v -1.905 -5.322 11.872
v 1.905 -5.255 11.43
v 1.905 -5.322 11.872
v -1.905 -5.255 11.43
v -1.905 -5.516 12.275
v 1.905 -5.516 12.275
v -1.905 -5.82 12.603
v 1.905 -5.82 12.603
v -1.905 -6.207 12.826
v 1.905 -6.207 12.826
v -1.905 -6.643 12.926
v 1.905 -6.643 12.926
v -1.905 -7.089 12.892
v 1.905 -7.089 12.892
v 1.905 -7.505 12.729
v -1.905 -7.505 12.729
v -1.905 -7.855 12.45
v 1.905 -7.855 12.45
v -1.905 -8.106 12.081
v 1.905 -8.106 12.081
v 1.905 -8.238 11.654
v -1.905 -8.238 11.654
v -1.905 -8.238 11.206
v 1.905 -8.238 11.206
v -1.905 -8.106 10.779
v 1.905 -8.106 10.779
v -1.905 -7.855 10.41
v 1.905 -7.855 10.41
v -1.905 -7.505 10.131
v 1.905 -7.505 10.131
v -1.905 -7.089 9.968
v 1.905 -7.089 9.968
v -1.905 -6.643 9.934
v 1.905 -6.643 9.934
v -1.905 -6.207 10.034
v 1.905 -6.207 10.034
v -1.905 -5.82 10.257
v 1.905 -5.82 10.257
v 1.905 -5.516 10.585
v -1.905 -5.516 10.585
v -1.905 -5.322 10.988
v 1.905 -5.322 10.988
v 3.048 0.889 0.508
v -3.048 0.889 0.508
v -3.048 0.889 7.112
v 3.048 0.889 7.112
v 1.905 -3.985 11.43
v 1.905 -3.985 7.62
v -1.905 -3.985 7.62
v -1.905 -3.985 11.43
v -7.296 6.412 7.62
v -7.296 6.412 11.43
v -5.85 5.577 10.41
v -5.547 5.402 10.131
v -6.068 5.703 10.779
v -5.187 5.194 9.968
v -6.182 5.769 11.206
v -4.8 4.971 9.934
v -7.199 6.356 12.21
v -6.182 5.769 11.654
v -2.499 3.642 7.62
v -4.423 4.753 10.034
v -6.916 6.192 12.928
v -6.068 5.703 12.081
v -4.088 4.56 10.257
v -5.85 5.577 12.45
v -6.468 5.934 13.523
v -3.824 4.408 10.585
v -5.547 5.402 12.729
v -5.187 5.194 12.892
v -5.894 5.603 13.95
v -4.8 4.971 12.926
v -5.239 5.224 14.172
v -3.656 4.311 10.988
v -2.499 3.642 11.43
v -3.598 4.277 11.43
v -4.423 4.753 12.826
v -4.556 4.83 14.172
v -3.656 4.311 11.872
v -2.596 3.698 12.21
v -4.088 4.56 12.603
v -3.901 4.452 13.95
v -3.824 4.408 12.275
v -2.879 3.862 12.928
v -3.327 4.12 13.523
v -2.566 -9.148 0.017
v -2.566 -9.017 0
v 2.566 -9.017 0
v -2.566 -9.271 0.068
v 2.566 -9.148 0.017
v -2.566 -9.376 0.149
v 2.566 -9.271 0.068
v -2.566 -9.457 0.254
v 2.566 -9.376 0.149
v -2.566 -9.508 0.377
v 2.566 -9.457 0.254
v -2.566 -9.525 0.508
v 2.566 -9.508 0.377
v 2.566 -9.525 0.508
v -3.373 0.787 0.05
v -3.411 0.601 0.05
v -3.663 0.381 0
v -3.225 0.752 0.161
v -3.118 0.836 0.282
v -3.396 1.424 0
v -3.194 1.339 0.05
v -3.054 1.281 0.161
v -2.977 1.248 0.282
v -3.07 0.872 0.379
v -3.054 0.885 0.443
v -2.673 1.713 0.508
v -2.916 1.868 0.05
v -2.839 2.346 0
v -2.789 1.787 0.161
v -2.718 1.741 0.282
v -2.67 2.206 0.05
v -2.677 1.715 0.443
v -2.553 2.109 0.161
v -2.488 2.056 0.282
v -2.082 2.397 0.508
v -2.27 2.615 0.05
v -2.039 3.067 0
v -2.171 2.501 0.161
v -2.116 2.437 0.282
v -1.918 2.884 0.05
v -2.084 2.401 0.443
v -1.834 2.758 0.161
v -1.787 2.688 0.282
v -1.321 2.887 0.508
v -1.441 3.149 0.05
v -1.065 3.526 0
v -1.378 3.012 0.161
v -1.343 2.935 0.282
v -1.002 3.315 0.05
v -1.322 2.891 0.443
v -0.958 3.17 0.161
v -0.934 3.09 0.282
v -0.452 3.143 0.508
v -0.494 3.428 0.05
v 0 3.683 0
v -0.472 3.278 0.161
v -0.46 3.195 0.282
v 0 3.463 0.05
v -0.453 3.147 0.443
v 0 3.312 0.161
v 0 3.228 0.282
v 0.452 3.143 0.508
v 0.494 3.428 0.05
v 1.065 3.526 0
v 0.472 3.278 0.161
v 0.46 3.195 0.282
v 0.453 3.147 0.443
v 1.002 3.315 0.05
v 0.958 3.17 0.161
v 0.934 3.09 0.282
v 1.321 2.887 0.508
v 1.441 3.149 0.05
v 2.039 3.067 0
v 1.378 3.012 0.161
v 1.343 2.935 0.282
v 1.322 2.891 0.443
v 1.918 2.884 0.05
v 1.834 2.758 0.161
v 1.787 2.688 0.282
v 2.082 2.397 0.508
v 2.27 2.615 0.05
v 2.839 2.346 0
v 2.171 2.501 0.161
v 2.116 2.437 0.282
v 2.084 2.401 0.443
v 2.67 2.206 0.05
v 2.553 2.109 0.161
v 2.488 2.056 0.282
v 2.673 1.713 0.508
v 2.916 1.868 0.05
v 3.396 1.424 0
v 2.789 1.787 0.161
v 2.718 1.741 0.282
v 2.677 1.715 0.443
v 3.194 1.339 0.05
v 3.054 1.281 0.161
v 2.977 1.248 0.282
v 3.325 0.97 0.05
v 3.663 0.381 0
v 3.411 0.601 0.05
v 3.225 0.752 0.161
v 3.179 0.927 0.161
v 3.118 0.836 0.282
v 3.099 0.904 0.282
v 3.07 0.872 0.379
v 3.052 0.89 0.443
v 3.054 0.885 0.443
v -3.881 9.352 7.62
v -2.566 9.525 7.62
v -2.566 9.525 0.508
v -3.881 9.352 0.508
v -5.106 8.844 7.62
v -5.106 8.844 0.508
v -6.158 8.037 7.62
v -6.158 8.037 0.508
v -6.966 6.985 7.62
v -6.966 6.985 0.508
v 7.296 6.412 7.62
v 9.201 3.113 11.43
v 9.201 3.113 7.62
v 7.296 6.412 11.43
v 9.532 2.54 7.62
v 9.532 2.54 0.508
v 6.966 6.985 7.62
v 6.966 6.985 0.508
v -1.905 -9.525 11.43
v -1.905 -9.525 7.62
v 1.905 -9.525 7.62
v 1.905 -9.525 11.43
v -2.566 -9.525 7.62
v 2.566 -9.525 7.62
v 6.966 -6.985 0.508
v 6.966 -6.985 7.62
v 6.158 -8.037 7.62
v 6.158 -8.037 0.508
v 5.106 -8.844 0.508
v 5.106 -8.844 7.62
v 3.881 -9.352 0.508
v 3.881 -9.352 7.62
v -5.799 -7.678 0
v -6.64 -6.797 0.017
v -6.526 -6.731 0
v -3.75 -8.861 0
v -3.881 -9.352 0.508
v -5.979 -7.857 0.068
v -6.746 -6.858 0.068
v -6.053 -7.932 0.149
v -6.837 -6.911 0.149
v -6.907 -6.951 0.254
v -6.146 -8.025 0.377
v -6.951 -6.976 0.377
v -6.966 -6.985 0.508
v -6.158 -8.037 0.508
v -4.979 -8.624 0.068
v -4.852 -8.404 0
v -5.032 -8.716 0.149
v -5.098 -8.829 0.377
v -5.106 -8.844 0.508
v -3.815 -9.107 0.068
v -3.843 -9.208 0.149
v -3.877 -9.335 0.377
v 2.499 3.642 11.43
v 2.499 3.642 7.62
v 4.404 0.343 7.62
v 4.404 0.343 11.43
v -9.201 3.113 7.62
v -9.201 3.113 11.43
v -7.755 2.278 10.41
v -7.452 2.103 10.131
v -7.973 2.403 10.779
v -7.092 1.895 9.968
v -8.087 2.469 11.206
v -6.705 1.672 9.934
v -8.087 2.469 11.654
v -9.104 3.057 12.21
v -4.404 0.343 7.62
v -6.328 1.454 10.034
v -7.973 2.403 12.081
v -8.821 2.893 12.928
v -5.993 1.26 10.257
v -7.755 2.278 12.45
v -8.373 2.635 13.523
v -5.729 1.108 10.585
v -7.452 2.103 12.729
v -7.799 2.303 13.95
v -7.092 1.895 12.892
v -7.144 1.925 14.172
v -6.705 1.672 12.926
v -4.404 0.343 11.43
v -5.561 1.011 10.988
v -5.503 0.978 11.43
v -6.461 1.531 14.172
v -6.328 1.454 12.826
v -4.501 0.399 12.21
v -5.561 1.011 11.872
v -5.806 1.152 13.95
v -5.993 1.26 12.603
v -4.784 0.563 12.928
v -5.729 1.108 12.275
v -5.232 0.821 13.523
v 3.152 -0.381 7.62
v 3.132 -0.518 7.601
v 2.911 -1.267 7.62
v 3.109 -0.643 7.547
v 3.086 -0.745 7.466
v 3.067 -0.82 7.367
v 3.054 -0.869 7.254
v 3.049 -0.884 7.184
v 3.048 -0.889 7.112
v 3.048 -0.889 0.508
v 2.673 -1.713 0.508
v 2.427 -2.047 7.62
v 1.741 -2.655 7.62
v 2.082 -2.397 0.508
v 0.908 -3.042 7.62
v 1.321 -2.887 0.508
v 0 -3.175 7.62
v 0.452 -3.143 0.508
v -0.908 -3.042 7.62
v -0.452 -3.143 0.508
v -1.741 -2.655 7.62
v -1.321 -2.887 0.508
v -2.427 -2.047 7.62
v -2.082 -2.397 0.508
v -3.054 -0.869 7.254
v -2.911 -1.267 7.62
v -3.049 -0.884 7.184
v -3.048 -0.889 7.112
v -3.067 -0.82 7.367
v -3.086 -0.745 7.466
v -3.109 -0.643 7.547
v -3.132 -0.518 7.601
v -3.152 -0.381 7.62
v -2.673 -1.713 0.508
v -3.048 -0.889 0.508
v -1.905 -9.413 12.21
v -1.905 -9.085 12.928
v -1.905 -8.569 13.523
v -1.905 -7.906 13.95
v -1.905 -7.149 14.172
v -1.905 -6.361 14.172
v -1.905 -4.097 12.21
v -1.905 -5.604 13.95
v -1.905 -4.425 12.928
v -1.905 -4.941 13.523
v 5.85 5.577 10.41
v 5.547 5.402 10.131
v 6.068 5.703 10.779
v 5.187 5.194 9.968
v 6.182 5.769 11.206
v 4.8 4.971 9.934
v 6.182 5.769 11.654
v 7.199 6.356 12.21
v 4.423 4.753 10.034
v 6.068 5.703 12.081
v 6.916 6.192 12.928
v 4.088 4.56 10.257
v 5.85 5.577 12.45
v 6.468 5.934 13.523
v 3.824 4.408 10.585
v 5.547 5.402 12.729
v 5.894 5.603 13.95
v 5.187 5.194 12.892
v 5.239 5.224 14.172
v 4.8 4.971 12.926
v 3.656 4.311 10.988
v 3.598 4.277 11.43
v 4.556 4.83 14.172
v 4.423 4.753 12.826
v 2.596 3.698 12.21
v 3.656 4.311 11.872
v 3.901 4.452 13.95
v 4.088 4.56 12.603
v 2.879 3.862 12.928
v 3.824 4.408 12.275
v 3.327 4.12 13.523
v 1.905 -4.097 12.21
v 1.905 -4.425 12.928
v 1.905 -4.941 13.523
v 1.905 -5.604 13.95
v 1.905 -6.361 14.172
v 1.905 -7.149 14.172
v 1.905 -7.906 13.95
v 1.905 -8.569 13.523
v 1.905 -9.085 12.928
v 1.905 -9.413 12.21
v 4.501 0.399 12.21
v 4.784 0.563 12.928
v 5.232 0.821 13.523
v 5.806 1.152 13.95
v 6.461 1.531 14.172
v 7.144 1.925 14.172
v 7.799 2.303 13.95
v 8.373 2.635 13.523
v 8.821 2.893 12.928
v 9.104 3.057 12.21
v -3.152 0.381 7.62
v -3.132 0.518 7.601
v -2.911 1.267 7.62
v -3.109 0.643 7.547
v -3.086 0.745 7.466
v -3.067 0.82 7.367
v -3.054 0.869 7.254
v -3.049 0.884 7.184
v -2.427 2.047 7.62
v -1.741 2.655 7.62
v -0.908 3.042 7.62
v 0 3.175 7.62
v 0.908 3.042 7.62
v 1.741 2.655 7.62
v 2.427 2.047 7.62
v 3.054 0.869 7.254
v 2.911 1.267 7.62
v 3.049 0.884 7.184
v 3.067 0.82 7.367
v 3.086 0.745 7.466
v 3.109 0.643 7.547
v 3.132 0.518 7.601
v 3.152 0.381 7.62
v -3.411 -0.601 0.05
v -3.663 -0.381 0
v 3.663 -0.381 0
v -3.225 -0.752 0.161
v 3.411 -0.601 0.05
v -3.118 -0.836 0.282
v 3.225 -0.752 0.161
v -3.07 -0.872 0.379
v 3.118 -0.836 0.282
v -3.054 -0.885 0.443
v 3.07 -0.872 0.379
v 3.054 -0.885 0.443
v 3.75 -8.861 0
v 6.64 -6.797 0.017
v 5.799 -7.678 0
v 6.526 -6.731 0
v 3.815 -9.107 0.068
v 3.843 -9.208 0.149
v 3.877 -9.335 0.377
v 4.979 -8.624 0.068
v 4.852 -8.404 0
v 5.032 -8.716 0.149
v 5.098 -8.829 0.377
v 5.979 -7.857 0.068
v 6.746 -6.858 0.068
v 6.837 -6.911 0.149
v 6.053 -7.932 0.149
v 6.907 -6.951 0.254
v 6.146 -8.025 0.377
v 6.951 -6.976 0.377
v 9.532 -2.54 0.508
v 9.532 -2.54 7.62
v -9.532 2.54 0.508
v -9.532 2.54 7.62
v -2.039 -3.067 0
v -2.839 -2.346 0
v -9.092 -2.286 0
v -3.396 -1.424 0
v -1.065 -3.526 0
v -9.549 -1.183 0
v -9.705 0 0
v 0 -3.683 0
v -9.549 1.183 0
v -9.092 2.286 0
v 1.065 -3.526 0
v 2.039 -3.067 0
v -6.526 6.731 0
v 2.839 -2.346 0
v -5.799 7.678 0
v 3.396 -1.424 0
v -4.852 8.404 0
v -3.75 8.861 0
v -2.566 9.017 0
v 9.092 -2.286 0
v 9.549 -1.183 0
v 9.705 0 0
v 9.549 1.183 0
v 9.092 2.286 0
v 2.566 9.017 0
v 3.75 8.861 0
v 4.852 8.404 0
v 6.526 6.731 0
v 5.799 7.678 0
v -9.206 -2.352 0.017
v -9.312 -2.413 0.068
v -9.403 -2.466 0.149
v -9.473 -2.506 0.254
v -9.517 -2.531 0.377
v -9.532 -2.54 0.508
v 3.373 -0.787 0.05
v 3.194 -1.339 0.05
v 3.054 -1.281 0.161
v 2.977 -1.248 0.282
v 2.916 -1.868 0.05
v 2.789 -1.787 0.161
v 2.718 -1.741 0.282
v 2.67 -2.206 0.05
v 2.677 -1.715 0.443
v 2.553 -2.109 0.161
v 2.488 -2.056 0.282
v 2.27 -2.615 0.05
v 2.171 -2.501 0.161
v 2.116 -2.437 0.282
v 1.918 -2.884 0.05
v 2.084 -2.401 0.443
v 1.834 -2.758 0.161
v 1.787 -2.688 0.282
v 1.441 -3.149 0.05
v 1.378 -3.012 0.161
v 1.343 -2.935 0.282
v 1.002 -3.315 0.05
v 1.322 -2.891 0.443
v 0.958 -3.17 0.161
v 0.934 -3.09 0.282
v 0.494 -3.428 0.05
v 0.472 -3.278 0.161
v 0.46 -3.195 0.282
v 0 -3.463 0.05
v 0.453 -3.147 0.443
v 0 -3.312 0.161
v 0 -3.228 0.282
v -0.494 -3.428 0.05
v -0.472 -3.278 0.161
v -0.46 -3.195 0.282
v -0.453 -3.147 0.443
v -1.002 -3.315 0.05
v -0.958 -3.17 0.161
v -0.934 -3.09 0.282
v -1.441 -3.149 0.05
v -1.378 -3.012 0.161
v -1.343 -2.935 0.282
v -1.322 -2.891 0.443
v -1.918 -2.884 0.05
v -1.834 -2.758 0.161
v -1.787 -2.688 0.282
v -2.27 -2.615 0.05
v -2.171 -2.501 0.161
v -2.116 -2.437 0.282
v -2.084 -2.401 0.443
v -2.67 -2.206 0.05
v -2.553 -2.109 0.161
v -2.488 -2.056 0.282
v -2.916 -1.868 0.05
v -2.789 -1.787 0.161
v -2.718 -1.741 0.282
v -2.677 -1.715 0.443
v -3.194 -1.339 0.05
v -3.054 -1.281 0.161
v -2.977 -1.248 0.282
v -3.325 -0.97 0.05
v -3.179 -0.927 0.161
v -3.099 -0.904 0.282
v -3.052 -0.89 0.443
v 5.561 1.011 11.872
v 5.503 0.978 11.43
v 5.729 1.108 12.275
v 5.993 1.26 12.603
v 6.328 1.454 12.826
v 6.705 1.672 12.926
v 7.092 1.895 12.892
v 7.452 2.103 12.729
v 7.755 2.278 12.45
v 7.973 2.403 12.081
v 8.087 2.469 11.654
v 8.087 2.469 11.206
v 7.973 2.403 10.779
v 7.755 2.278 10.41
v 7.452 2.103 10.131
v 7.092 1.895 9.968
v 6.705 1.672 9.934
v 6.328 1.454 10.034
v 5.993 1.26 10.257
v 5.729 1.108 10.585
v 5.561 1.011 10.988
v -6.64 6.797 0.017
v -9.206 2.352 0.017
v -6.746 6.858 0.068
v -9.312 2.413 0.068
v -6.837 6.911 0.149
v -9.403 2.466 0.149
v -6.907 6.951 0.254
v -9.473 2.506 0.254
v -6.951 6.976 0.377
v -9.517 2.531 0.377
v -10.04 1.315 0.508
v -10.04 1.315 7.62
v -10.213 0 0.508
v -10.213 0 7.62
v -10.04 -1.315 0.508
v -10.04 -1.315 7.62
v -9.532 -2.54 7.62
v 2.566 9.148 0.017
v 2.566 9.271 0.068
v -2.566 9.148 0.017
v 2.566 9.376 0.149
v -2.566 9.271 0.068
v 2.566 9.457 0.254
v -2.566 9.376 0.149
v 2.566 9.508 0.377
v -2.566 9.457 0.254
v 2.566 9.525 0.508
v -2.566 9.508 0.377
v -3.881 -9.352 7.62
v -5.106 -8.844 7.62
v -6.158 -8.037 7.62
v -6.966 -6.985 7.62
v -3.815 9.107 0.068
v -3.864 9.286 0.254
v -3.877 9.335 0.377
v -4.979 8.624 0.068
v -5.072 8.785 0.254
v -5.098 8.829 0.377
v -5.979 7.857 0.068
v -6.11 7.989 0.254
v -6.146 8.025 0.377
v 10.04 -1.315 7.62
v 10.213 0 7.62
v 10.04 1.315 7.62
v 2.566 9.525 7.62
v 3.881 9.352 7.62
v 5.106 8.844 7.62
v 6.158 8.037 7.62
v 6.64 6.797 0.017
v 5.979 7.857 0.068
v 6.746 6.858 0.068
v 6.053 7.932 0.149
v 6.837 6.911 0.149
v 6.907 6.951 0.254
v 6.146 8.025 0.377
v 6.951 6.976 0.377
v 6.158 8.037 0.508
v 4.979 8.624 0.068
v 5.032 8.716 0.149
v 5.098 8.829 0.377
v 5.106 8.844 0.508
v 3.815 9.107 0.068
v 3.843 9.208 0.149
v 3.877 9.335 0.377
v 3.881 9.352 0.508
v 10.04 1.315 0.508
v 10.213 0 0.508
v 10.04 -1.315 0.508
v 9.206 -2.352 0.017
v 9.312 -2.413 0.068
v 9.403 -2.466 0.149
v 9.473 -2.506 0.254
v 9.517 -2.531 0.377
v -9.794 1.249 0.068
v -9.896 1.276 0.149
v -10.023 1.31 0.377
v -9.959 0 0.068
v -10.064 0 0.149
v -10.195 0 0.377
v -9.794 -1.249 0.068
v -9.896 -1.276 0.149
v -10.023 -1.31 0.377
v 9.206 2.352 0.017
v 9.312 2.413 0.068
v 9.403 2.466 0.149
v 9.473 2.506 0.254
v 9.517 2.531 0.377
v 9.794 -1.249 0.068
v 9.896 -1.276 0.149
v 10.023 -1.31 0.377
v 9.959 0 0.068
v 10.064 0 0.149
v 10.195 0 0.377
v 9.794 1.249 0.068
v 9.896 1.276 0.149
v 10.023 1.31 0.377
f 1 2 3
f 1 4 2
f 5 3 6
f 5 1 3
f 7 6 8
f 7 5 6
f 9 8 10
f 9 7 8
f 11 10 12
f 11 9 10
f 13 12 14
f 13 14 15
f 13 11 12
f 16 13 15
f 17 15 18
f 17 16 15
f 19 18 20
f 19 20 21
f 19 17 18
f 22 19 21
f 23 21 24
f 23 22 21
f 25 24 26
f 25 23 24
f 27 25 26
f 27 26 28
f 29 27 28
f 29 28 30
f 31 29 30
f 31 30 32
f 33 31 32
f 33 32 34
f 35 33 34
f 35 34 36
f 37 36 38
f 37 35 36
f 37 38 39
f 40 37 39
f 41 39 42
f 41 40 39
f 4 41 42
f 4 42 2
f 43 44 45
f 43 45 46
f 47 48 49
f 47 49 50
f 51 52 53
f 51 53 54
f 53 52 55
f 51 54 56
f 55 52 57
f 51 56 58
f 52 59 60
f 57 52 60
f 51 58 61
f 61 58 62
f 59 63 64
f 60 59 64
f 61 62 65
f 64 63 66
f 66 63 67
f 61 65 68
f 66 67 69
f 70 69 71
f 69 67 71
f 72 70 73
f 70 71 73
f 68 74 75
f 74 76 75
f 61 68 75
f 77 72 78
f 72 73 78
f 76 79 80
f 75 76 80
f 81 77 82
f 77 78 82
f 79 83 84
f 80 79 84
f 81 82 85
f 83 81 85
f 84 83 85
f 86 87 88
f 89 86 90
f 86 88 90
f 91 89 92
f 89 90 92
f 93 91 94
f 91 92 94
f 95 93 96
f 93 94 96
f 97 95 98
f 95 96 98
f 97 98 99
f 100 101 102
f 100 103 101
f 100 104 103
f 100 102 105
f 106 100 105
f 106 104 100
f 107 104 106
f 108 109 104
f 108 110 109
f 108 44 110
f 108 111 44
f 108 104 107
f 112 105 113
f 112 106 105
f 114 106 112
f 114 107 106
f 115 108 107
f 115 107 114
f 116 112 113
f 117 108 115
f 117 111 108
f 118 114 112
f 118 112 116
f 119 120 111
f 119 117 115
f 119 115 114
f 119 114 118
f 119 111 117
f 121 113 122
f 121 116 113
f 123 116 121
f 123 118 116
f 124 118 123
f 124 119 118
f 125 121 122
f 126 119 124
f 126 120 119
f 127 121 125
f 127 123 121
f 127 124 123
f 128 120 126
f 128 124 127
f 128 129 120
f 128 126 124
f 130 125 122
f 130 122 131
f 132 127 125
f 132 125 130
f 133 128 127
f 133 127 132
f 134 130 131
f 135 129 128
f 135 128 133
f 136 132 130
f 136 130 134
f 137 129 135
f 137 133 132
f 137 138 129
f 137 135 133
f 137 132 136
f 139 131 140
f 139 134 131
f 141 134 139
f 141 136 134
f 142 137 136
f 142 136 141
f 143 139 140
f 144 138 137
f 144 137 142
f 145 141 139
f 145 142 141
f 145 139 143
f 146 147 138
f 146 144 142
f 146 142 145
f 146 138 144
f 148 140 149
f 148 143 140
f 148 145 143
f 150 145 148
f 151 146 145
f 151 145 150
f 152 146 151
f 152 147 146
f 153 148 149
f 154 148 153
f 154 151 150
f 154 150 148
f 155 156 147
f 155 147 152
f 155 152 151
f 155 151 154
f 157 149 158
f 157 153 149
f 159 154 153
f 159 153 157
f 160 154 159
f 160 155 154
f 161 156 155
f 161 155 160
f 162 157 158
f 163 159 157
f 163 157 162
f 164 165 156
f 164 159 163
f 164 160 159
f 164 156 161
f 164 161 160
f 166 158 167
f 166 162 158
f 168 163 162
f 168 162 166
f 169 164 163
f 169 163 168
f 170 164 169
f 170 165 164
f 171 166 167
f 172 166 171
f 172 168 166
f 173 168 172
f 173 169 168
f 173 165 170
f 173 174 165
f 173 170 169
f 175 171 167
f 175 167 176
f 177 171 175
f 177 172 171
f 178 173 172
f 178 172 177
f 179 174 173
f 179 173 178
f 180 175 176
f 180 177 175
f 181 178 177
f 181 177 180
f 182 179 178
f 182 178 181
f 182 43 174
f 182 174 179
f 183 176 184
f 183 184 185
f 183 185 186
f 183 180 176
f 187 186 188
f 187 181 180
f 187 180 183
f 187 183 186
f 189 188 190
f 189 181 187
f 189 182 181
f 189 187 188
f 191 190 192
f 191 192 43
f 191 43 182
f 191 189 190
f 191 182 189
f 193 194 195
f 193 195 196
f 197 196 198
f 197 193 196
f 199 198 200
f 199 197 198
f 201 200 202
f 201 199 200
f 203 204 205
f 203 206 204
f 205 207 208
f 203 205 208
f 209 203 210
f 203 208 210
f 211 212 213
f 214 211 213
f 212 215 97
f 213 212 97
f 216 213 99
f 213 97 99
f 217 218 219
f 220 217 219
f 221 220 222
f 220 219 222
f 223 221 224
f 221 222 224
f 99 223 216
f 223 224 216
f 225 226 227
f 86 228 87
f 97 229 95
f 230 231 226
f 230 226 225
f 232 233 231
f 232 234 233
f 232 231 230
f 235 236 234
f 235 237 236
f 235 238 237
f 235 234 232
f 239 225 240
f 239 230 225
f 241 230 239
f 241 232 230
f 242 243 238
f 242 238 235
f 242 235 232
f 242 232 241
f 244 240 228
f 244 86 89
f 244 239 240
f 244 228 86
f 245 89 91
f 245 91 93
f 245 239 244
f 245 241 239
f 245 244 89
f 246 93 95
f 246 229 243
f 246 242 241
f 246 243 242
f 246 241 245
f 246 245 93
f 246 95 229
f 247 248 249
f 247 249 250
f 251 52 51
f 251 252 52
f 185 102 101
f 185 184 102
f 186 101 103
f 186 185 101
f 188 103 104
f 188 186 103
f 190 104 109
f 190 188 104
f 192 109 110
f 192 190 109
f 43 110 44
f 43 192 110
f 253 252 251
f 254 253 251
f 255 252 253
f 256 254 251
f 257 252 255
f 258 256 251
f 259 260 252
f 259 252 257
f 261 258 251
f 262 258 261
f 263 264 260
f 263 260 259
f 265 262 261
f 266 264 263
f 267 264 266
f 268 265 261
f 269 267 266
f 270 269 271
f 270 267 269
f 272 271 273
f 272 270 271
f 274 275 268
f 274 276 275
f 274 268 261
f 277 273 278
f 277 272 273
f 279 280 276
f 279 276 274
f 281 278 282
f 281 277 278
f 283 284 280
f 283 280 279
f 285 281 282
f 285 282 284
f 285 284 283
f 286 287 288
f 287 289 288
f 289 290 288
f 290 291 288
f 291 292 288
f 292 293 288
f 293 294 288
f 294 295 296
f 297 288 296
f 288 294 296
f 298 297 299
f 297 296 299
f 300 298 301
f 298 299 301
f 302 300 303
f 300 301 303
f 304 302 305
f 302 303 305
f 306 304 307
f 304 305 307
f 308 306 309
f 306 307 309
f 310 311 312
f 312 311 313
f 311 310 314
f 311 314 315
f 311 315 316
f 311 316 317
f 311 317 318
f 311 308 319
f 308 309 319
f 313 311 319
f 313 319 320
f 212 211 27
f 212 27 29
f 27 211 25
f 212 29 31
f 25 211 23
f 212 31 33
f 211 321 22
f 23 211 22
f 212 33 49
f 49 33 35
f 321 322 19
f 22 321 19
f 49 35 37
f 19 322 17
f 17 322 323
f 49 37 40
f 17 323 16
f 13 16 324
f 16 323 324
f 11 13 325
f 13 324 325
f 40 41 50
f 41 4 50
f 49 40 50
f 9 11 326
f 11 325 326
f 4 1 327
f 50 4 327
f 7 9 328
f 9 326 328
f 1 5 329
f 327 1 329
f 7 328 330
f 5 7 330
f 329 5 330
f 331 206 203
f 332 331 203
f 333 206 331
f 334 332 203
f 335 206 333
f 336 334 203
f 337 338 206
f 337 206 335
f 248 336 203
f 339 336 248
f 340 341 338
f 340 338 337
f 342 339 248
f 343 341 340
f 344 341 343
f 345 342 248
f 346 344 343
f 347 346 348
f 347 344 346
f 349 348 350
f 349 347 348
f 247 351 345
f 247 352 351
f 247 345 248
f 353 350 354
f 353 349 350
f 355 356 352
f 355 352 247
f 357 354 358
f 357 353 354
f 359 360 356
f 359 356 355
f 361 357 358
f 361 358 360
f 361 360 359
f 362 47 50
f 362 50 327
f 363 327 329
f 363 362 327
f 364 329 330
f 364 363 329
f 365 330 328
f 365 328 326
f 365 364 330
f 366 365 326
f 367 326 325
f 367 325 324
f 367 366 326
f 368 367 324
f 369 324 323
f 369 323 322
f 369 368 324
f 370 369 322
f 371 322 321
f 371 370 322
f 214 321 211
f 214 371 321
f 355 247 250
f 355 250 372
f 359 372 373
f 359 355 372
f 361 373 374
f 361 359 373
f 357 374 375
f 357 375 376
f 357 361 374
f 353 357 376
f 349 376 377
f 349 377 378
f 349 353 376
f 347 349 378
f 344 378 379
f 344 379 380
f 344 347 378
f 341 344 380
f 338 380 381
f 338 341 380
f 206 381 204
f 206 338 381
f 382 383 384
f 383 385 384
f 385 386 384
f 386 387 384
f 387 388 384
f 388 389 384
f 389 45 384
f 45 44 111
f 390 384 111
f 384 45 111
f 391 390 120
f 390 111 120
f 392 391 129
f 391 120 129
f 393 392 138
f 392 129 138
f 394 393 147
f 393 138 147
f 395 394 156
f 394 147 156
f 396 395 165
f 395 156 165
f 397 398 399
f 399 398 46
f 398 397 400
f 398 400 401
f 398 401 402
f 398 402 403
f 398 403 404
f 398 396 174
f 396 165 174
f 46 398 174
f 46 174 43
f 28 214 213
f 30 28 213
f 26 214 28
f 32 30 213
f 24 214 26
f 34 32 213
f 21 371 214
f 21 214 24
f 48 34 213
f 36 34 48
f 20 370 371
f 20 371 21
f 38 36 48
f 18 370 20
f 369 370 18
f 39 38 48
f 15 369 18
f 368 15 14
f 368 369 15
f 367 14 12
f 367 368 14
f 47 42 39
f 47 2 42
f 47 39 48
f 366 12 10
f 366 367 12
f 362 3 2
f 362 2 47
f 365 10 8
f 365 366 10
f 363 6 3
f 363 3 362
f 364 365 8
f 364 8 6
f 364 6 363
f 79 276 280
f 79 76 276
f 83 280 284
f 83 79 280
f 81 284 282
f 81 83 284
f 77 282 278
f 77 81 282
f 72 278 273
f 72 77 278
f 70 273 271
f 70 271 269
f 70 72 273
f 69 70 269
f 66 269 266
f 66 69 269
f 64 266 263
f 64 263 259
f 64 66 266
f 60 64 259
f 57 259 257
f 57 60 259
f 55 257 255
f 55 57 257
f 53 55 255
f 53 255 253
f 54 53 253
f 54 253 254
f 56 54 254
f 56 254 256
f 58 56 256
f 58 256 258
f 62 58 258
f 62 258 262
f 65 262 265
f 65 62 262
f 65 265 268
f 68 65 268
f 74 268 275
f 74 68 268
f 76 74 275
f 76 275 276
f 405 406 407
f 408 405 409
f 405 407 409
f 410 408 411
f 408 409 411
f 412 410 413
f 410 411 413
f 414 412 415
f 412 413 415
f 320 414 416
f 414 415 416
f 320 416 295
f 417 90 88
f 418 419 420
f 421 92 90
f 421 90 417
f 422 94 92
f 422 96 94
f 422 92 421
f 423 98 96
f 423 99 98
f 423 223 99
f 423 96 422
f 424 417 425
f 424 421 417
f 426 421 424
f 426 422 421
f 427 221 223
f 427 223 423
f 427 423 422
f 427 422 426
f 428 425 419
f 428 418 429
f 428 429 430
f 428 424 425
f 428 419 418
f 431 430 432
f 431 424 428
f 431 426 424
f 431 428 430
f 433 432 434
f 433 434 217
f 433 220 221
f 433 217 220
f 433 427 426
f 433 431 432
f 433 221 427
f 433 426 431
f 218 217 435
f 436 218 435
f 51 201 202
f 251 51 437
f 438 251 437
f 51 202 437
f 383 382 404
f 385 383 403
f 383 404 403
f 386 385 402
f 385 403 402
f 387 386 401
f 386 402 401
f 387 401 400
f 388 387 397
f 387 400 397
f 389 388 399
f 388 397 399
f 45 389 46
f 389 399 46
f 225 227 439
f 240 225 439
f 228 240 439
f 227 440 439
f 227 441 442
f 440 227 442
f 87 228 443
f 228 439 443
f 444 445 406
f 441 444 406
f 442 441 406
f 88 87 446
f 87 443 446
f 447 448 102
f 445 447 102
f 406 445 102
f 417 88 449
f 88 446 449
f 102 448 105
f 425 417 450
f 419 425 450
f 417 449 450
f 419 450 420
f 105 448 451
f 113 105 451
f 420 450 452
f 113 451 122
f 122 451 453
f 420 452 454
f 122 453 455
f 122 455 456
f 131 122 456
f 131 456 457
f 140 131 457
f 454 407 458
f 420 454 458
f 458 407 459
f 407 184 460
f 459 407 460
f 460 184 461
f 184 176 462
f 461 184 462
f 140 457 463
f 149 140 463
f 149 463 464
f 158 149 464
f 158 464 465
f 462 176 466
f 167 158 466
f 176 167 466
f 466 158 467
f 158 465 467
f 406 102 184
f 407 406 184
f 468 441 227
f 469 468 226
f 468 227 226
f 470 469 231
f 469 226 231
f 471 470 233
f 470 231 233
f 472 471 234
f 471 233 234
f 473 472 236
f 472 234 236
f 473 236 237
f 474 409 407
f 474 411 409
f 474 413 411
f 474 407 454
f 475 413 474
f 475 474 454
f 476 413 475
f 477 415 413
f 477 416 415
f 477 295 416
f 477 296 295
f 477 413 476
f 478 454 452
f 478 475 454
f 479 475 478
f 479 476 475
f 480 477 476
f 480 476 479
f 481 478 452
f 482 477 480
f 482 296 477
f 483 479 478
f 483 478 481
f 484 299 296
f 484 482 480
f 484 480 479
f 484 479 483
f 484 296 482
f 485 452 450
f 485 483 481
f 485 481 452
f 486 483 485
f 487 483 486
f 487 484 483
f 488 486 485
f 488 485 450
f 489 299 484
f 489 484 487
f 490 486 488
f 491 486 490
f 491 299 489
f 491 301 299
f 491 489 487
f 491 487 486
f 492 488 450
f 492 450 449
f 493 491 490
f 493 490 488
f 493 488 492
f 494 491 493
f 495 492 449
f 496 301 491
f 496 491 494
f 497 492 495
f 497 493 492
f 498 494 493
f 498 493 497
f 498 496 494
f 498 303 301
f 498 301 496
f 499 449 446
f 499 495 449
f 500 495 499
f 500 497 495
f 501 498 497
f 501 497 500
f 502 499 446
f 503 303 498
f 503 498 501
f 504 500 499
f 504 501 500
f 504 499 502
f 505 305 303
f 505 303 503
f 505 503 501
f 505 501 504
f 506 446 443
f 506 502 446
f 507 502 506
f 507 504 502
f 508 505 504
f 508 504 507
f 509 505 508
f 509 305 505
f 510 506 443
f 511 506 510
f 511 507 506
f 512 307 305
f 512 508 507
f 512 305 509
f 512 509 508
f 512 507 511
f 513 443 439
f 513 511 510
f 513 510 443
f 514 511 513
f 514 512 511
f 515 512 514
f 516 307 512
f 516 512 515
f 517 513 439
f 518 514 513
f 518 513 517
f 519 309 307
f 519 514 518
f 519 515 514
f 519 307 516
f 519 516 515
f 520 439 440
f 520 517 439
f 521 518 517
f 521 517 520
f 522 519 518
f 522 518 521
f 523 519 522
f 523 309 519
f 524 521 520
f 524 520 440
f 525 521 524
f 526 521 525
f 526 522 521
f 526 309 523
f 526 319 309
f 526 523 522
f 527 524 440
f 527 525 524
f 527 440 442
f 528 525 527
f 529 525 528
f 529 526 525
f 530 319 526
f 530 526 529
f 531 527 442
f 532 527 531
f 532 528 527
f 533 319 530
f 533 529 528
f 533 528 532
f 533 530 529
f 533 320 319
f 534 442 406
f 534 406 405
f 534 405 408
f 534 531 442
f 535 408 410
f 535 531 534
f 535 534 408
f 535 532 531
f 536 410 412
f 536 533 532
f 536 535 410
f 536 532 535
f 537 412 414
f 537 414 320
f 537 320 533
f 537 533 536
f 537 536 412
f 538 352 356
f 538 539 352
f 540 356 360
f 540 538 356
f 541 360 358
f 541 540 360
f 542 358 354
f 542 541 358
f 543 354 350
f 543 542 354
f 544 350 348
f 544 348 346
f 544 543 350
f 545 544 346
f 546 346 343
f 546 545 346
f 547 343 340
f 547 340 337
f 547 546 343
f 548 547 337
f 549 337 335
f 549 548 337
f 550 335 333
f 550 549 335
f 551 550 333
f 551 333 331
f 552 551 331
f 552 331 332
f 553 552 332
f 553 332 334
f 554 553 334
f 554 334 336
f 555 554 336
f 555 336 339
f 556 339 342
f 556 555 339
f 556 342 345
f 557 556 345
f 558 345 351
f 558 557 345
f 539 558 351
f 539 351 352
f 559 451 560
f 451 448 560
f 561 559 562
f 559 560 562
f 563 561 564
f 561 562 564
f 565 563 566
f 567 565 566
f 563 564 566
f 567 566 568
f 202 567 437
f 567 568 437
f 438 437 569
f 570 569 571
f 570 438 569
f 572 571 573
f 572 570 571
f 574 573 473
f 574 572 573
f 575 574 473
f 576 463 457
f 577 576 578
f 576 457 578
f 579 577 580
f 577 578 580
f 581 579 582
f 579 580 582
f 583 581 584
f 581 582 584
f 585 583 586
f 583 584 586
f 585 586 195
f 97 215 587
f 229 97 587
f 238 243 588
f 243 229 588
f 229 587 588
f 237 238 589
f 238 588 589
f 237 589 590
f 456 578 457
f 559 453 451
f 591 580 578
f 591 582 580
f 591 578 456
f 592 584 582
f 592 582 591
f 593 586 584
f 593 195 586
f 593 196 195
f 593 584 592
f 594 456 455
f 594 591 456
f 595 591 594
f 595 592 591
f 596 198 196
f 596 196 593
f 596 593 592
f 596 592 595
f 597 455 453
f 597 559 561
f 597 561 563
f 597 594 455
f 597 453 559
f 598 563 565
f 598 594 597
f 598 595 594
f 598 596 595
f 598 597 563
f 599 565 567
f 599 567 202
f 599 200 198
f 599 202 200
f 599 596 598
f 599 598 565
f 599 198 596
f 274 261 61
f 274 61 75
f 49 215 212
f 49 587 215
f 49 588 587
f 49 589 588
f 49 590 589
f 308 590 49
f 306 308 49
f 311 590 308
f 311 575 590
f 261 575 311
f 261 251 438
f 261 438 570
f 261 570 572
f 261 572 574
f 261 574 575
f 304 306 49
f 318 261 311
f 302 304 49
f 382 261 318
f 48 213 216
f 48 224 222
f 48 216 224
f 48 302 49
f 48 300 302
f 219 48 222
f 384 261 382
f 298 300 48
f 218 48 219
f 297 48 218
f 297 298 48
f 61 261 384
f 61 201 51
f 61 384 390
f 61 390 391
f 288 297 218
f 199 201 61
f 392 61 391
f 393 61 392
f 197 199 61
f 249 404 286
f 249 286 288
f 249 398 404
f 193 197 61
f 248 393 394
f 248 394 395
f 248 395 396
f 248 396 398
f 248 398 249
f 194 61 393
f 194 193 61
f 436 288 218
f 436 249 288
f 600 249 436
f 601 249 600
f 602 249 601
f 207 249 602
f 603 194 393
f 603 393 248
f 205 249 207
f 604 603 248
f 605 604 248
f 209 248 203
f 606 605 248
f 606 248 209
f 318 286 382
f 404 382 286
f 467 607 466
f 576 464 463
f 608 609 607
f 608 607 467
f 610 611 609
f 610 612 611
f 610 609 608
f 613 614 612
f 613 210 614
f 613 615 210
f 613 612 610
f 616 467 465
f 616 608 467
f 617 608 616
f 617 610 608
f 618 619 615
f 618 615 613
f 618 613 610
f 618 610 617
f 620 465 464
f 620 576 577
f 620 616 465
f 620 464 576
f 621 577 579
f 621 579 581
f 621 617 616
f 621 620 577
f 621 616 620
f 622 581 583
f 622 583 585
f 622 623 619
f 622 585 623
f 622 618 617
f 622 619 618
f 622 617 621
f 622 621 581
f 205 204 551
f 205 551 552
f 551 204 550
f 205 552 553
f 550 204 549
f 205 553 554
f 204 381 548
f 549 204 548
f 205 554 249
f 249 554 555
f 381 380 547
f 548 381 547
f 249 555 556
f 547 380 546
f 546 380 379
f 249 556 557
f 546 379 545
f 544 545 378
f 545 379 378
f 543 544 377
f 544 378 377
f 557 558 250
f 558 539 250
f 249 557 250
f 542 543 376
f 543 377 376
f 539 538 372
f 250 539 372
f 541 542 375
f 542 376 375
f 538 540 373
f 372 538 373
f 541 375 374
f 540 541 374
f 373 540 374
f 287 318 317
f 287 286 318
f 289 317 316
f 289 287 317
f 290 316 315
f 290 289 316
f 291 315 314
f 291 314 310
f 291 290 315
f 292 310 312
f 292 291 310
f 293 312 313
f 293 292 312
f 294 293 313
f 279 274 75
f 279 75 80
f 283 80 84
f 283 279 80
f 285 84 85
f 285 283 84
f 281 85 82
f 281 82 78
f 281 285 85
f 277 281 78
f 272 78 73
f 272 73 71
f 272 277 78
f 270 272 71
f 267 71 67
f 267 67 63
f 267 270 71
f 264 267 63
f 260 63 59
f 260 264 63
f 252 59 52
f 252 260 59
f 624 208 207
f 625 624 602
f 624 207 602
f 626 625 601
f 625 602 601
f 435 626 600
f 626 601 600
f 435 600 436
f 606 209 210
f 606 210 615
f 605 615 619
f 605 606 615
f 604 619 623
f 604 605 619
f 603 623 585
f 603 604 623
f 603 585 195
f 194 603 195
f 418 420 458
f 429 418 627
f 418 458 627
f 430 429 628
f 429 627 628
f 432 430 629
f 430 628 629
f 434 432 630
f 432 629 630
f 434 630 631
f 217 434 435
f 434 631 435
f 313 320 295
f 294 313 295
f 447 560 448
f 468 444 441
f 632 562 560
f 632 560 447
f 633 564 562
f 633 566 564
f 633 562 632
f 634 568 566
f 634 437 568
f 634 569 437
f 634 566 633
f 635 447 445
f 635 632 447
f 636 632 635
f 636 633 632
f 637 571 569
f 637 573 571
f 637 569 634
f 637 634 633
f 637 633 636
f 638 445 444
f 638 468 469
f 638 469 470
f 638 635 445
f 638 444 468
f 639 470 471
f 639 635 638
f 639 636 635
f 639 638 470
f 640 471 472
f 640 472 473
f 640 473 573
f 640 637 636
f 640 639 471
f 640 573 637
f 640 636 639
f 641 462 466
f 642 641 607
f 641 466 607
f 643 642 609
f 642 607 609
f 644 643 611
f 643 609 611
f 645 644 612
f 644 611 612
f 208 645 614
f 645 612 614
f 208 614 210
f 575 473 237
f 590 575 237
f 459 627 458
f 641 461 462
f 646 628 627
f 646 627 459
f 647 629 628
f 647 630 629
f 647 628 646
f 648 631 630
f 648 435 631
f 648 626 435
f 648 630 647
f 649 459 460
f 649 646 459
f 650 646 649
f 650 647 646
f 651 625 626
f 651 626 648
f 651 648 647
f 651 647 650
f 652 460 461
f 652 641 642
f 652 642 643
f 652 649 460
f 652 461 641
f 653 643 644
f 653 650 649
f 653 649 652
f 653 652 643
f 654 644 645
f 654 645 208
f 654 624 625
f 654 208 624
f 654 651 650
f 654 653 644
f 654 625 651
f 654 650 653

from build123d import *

# Parameters (mm, degrees)
F0_W            = 6.096
F0_H            = 1.778
F1_DEPTH        = 7.62
F2_R            = 1.5
F3_DEPTH        = 1.905
F3_COPIES_COUNT = 3
F4_R            = 5.08
F5_R            = 0.508


# Not quite as in the source:
# - a pattern or mirror of a feature is missing from the dataset's text; its kind, count and spacing are read off the source's solid


with BuildPart() as f1:
    # F0 (on Top) → F1 (new body)
    with BuildSketch(Plane.XY):
        Polygon((10.9985226281, 0), (5.499261314, 9.525), (-5.499261314, 9.525), (-10.9985226281, 0), (-5.499261314, -9.525), (5.499261314, -9.525), align=None)
        with BuildLine():
            ThreePointArc((3.048, 0.889), (3.1430896424, 0.4490128061), (3.175, 0))
            ThreePointArc((3.175, 0), (3.1430896424, -0.4490128061), (3.048, -0.889))
            ThreePointArc((3.048, -0.889), (0, -3.175), (-3.048, -0.889))
            ThreePointArc((-3.048, -0.889), (-3.175, 0), (-3.048, 0.889))
            ThreePointArc((-3.048, 0.889), (0, 3.175), (3.048, 0.889))
        make_face(mode=Mode.SUBTRACT)
        Rectangle(F0_W, F0_H)
        with BuildLine():
            Line((-3.048, -0.889), (-3.048, 0.889))
            ThreePointArc((-3.048, 0.889), (-3.175, 0), (-3.048, -0.889))
        make_face()
        with BuildLine():
            ThreePointArc((3.048, -0.889), (3.1430896424, -0.4490128061), (3.175, 0))
            ThreePointArc((3.175, 0), (3.1430896424, 0.4490128061), (3.048, 0.889))
            Line((3.048, 0.889), (3.048, -0.889))
        make_face()
    extrude(amount=F1_DEPTH)

    # F2 (on Right) → F3 (join, symmetric)
    with BuildSketch(Plane.YZ):
        with BuildLine():
            Line((-9.525, 7.62), (-3.985, 7.62))
            Line((-3.985, 7.62), (-3.985, 11.43))
            ThreePointArc((-3.985, 11.43), (-6.755, 14.2), (-9.525, 11.43))
            Line((-9.525, 11.43), (-9.525, 7.62))
        make_face()
        with Locations((-6.755, 11.43)):
            Circle(F2_R, mode=Mode.SUBTRACT)
    f3 = extrude(amount=F3_DEPTH, both=True)

    # F3_copies: F3 ×3 about axis
    f3_copies_axis = Axis((0, 0, 0), (0, 0, 1))
    for i in range(1, F3_COPIES_COUNT):
        add(f3.rotate(f3_copies_axis, i * 360 / F3_COPIES_COUNT))

    # F4
    f4_edges = [f1.edges().sort_by_distance(p)[0] for p in [
        (-5.499261, -9.525, 3.81),
        (-10.998523, 0, 3.81),
        (-5.499261, 9.525, 3.81),
        (5.499261, 9.525, 3.81),
        (10.998523, 0, 3.81),
        (5.499261, -9.525, 3.81),
    ]]
    fillet(f4_edges, radius=F4_R)

    # F5
    f5_edges = [f1.edges().sort_by_distance(p)[0] for p in [
        (0, -0.889, 7.62),
        (0, 0.889, 7.62),
        (0, -0.889, 0),
        (0, 0.889, 0),
        (0, 3.175, 0),
        (-8.248892, 4.7625, 0),
        (8.248892, 4.7625, 0),
        (10.212644, 0, 0),
        (5.106322, 8.844409, 0),
        (8.248892, -4.7625, 0),
        (0, 9.525, 0),
        (5.106322, -8.844409, 0),
        (-5.106322, 8.844409, 0),
        (0, -9.525, 0),
        (-5.106322, -8.844409, 0),
        (-10.212644, 0, 0),
        (-8.248892, -4.7625, 0),
        (0, -3.175, 0),
    ]]
    fillet(f5_edges, radius=F5_R)


solid = f1.part
